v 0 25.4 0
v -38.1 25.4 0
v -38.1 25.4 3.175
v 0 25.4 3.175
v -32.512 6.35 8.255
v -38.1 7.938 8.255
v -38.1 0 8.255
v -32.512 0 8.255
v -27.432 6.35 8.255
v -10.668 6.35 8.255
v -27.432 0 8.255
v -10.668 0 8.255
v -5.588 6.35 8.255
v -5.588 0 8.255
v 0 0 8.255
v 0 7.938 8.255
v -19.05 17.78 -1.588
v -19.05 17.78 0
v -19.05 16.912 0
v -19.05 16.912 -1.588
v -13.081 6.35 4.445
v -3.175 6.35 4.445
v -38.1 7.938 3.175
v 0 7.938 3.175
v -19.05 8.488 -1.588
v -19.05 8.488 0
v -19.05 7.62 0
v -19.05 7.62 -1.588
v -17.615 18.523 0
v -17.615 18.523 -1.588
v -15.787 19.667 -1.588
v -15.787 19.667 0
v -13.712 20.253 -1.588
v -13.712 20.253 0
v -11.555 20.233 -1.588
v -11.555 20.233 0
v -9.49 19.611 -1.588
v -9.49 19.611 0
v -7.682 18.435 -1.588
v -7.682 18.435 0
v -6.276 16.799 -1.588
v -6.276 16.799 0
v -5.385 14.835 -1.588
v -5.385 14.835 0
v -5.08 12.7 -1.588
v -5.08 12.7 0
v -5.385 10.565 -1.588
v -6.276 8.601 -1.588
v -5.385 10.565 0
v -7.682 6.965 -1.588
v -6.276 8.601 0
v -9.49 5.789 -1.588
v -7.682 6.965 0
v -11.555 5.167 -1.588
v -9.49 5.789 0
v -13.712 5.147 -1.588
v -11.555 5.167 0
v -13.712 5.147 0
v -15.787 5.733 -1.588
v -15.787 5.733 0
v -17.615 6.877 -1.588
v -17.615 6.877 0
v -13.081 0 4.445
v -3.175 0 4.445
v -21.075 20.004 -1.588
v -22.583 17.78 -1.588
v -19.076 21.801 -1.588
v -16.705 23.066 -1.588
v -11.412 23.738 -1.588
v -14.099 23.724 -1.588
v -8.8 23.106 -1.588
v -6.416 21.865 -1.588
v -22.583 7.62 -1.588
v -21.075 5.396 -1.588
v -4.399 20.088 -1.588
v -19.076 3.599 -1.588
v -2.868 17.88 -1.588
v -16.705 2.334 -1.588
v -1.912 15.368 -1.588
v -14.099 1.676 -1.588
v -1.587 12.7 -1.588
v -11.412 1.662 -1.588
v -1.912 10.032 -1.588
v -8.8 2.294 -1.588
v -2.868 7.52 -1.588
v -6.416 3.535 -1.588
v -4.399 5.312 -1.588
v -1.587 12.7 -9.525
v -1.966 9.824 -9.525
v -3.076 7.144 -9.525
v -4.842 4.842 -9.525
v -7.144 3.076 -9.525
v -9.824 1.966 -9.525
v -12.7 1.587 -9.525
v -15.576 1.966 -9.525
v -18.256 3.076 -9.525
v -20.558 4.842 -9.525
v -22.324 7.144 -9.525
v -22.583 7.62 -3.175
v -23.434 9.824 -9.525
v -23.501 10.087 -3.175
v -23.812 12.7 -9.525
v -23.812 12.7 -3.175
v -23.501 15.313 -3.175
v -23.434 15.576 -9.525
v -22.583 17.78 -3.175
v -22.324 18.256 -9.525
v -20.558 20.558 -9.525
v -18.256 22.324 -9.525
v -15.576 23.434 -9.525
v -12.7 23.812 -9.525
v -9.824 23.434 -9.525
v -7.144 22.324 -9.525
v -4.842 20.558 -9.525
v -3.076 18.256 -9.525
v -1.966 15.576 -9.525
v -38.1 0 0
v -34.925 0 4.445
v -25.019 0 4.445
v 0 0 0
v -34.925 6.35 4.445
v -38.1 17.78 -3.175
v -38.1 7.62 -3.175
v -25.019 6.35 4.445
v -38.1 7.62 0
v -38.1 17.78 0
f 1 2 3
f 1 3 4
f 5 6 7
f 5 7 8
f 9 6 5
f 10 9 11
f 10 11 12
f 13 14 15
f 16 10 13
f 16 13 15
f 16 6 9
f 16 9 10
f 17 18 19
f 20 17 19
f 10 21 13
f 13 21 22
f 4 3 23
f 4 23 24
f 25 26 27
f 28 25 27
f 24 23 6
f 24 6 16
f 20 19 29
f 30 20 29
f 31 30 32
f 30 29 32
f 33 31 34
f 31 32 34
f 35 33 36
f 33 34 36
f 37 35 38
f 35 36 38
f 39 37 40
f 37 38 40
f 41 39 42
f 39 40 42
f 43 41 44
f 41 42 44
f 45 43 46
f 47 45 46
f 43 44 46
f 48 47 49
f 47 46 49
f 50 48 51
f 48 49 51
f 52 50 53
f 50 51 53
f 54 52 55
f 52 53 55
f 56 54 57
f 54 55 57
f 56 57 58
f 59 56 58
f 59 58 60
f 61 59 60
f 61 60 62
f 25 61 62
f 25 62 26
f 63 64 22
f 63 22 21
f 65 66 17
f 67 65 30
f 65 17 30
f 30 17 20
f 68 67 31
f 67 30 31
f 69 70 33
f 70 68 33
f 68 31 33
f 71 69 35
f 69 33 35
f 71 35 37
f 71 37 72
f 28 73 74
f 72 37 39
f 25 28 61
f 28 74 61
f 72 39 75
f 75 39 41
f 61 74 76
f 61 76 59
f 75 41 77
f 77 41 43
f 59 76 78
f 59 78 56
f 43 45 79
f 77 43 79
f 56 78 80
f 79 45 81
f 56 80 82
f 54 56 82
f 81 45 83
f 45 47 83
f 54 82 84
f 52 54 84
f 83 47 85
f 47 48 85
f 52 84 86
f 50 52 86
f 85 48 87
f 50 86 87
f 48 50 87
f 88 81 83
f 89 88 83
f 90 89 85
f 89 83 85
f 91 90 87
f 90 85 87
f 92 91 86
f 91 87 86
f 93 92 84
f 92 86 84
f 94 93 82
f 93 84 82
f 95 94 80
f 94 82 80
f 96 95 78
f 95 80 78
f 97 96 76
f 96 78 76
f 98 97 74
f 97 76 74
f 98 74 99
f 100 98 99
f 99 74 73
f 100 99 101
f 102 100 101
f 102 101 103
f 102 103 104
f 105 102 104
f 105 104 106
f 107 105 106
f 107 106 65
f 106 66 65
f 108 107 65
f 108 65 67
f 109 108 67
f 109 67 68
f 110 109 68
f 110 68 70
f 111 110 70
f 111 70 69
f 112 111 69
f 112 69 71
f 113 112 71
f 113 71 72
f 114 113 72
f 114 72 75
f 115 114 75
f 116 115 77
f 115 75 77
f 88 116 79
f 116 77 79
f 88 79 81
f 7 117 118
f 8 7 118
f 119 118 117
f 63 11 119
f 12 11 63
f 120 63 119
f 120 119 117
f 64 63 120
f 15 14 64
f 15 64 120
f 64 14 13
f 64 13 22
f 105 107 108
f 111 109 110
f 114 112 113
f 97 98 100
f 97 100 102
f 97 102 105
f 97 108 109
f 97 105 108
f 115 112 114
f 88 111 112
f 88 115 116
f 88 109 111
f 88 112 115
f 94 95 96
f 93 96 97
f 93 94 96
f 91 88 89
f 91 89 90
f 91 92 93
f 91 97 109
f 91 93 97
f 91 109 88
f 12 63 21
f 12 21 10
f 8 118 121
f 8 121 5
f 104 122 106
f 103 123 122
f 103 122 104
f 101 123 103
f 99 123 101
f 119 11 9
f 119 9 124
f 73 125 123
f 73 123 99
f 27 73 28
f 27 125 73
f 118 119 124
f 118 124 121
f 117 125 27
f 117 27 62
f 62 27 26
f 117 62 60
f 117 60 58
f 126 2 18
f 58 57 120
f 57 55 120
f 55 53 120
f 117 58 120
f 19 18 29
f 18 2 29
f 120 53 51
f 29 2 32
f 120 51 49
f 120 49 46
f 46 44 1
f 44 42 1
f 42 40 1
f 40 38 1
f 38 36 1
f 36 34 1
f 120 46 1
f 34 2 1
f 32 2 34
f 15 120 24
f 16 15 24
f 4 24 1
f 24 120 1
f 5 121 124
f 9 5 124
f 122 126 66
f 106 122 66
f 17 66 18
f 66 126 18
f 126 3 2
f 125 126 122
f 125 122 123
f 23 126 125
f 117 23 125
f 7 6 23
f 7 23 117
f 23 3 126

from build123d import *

# Parameters (mm, degrees)
F0_W      = 38.1
F0_H      = 25.4
F1_DEPTH  = 3.175
F3_DEPTH  = 6.35
F4_W      = 38.1
F4_H      = 1.5875
F5_DEPTH  = 5.08
F6_R      = 11.1125
F7_DEPTH  = 9.525
F8_R      = 11.43
F8_R_2    = 7.62
F9_DEPTH  = 1.5875
F10_W     = 19.05
F10_H     = 10.16
F11_DEPTH = 3.175


with BuildPart() as f1:
    # F0 (on Top) → F1 (new body)
    with BuildSketch(Plane.XY):
        with Locations((-19.05, 12.7)):
            Rectangle(F0_W, F0_H)
    extrude(amount=F1_DEPTH)

    # F2 (on face) → F3 (join)
    with BuildSketch(Plane.XZ):
        Polygon((-38.1, 8.255), (-38.1, 3.175), (0, 3.175), (0, 8.255), (-5.588, 8.255), (-3.175, 4.445), (-13.081, 4.445), (-10.668, 8.255), (-27.432, 8.255), (-25.019, 4.445), (-34.925, 4.445), (-32.512, 8.255), align=None)
    extrude(amount=-F3_DEPTH)

    # F4 (on face) → F5 (join, through all)
    with BuildSketch(Plane.XY.offset(3.175)):
        with Locations((-19.05, 7.14375)):
            Rectangle(F4_W, F4_H)
    extrude(amount=F5_DEPTH)

    # F6 (on face) → F7 (join)
    with BuildSketch(Plane(origin=(0, 0, 0), x_dir=(1, 0, 0), z_dir=(0, 0, -1))):
        with Locations((-12.7, -12.7)):
            Circle(F6_R)
    extrude(amount=F7_DEPTH)

    # F8 (on face) → F9 (cut)
    with BuildSketch(Plane(origin=(0, 0, 0), x_dir=(1, 0, 0), z_dir=(0, 0, -1))):
        with Locations((-12.7, -12.7)):
            Circle(F8_R)
        with Locations((-12.7, -12.7)):
            Circle(F8_R_2, mode=Mode.SUBTRACT)
    extrude(amount=F9_DEPTH, mode=Mode.SUBTRACT)

    # F10 (on face) → F11 (join)
    with BuildSketch(Plane(origin=(0, 0, 0), x_dir=(1, 0, 0), z_dir=(0, 0, -1))):
        with Locations((-28.575, -12.7)):
            Rectangle(F10_W, F10_H)
    extrude(amount=F11_DEPTH)


solid = f1.part
